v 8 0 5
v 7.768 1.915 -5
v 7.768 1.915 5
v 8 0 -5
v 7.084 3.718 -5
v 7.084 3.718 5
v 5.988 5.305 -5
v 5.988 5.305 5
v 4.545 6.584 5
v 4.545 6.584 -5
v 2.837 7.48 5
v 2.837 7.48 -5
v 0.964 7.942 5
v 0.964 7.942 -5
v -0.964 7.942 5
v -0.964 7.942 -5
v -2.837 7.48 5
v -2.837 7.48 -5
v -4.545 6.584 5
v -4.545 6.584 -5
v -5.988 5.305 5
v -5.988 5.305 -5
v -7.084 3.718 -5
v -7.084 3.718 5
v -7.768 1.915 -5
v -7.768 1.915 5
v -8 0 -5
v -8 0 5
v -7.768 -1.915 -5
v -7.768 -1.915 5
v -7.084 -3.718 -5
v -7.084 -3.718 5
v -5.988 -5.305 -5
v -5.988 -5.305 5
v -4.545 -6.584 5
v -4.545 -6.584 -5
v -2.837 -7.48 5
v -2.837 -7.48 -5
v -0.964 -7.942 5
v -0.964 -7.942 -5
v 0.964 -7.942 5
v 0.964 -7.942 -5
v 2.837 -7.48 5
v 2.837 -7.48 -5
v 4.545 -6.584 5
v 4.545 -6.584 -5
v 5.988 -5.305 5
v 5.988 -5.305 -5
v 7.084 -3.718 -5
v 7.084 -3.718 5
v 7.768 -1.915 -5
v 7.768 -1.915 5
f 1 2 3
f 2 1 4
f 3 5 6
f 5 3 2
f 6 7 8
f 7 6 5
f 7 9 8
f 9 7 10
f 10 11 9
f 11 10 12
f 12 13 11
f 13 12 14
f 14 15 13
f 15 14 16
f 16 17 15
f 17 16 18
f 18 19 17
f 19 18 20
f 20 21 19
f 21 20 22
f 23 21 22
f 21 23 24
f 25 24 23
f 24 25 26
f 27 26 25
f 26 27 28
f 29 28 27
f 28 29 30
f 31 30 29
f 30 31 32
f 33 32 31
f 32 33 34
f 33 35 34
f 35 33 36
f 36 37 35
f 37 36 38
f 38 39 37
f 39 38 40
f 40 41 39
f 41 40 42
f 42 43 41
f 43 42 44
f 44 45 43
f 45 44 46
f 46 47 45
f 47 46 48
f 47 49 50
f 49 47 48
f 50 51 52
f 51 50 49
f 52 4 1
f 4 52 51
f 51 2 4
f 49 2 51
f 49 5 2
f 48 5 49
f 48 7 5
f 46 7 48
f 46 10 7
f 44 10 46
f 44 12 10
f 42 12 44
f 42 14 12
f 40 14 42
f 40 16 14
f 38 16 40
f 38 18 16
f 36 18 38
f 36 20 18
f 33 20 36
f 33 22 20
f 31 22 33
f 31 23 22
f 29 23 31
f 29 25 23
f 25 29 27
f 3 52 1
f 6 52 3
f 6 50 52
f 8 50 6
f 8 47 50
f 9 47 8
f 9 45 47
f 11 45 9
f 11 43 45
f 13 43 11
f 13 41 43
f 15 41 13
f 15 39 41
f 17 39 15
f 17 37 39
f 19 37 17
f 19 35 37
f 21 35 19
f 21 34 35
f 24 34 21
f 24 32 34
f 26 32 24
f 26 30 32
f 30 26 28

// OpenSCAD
// Generated by generate_scads.py
cylinder(h=10, r=8, center=true);
